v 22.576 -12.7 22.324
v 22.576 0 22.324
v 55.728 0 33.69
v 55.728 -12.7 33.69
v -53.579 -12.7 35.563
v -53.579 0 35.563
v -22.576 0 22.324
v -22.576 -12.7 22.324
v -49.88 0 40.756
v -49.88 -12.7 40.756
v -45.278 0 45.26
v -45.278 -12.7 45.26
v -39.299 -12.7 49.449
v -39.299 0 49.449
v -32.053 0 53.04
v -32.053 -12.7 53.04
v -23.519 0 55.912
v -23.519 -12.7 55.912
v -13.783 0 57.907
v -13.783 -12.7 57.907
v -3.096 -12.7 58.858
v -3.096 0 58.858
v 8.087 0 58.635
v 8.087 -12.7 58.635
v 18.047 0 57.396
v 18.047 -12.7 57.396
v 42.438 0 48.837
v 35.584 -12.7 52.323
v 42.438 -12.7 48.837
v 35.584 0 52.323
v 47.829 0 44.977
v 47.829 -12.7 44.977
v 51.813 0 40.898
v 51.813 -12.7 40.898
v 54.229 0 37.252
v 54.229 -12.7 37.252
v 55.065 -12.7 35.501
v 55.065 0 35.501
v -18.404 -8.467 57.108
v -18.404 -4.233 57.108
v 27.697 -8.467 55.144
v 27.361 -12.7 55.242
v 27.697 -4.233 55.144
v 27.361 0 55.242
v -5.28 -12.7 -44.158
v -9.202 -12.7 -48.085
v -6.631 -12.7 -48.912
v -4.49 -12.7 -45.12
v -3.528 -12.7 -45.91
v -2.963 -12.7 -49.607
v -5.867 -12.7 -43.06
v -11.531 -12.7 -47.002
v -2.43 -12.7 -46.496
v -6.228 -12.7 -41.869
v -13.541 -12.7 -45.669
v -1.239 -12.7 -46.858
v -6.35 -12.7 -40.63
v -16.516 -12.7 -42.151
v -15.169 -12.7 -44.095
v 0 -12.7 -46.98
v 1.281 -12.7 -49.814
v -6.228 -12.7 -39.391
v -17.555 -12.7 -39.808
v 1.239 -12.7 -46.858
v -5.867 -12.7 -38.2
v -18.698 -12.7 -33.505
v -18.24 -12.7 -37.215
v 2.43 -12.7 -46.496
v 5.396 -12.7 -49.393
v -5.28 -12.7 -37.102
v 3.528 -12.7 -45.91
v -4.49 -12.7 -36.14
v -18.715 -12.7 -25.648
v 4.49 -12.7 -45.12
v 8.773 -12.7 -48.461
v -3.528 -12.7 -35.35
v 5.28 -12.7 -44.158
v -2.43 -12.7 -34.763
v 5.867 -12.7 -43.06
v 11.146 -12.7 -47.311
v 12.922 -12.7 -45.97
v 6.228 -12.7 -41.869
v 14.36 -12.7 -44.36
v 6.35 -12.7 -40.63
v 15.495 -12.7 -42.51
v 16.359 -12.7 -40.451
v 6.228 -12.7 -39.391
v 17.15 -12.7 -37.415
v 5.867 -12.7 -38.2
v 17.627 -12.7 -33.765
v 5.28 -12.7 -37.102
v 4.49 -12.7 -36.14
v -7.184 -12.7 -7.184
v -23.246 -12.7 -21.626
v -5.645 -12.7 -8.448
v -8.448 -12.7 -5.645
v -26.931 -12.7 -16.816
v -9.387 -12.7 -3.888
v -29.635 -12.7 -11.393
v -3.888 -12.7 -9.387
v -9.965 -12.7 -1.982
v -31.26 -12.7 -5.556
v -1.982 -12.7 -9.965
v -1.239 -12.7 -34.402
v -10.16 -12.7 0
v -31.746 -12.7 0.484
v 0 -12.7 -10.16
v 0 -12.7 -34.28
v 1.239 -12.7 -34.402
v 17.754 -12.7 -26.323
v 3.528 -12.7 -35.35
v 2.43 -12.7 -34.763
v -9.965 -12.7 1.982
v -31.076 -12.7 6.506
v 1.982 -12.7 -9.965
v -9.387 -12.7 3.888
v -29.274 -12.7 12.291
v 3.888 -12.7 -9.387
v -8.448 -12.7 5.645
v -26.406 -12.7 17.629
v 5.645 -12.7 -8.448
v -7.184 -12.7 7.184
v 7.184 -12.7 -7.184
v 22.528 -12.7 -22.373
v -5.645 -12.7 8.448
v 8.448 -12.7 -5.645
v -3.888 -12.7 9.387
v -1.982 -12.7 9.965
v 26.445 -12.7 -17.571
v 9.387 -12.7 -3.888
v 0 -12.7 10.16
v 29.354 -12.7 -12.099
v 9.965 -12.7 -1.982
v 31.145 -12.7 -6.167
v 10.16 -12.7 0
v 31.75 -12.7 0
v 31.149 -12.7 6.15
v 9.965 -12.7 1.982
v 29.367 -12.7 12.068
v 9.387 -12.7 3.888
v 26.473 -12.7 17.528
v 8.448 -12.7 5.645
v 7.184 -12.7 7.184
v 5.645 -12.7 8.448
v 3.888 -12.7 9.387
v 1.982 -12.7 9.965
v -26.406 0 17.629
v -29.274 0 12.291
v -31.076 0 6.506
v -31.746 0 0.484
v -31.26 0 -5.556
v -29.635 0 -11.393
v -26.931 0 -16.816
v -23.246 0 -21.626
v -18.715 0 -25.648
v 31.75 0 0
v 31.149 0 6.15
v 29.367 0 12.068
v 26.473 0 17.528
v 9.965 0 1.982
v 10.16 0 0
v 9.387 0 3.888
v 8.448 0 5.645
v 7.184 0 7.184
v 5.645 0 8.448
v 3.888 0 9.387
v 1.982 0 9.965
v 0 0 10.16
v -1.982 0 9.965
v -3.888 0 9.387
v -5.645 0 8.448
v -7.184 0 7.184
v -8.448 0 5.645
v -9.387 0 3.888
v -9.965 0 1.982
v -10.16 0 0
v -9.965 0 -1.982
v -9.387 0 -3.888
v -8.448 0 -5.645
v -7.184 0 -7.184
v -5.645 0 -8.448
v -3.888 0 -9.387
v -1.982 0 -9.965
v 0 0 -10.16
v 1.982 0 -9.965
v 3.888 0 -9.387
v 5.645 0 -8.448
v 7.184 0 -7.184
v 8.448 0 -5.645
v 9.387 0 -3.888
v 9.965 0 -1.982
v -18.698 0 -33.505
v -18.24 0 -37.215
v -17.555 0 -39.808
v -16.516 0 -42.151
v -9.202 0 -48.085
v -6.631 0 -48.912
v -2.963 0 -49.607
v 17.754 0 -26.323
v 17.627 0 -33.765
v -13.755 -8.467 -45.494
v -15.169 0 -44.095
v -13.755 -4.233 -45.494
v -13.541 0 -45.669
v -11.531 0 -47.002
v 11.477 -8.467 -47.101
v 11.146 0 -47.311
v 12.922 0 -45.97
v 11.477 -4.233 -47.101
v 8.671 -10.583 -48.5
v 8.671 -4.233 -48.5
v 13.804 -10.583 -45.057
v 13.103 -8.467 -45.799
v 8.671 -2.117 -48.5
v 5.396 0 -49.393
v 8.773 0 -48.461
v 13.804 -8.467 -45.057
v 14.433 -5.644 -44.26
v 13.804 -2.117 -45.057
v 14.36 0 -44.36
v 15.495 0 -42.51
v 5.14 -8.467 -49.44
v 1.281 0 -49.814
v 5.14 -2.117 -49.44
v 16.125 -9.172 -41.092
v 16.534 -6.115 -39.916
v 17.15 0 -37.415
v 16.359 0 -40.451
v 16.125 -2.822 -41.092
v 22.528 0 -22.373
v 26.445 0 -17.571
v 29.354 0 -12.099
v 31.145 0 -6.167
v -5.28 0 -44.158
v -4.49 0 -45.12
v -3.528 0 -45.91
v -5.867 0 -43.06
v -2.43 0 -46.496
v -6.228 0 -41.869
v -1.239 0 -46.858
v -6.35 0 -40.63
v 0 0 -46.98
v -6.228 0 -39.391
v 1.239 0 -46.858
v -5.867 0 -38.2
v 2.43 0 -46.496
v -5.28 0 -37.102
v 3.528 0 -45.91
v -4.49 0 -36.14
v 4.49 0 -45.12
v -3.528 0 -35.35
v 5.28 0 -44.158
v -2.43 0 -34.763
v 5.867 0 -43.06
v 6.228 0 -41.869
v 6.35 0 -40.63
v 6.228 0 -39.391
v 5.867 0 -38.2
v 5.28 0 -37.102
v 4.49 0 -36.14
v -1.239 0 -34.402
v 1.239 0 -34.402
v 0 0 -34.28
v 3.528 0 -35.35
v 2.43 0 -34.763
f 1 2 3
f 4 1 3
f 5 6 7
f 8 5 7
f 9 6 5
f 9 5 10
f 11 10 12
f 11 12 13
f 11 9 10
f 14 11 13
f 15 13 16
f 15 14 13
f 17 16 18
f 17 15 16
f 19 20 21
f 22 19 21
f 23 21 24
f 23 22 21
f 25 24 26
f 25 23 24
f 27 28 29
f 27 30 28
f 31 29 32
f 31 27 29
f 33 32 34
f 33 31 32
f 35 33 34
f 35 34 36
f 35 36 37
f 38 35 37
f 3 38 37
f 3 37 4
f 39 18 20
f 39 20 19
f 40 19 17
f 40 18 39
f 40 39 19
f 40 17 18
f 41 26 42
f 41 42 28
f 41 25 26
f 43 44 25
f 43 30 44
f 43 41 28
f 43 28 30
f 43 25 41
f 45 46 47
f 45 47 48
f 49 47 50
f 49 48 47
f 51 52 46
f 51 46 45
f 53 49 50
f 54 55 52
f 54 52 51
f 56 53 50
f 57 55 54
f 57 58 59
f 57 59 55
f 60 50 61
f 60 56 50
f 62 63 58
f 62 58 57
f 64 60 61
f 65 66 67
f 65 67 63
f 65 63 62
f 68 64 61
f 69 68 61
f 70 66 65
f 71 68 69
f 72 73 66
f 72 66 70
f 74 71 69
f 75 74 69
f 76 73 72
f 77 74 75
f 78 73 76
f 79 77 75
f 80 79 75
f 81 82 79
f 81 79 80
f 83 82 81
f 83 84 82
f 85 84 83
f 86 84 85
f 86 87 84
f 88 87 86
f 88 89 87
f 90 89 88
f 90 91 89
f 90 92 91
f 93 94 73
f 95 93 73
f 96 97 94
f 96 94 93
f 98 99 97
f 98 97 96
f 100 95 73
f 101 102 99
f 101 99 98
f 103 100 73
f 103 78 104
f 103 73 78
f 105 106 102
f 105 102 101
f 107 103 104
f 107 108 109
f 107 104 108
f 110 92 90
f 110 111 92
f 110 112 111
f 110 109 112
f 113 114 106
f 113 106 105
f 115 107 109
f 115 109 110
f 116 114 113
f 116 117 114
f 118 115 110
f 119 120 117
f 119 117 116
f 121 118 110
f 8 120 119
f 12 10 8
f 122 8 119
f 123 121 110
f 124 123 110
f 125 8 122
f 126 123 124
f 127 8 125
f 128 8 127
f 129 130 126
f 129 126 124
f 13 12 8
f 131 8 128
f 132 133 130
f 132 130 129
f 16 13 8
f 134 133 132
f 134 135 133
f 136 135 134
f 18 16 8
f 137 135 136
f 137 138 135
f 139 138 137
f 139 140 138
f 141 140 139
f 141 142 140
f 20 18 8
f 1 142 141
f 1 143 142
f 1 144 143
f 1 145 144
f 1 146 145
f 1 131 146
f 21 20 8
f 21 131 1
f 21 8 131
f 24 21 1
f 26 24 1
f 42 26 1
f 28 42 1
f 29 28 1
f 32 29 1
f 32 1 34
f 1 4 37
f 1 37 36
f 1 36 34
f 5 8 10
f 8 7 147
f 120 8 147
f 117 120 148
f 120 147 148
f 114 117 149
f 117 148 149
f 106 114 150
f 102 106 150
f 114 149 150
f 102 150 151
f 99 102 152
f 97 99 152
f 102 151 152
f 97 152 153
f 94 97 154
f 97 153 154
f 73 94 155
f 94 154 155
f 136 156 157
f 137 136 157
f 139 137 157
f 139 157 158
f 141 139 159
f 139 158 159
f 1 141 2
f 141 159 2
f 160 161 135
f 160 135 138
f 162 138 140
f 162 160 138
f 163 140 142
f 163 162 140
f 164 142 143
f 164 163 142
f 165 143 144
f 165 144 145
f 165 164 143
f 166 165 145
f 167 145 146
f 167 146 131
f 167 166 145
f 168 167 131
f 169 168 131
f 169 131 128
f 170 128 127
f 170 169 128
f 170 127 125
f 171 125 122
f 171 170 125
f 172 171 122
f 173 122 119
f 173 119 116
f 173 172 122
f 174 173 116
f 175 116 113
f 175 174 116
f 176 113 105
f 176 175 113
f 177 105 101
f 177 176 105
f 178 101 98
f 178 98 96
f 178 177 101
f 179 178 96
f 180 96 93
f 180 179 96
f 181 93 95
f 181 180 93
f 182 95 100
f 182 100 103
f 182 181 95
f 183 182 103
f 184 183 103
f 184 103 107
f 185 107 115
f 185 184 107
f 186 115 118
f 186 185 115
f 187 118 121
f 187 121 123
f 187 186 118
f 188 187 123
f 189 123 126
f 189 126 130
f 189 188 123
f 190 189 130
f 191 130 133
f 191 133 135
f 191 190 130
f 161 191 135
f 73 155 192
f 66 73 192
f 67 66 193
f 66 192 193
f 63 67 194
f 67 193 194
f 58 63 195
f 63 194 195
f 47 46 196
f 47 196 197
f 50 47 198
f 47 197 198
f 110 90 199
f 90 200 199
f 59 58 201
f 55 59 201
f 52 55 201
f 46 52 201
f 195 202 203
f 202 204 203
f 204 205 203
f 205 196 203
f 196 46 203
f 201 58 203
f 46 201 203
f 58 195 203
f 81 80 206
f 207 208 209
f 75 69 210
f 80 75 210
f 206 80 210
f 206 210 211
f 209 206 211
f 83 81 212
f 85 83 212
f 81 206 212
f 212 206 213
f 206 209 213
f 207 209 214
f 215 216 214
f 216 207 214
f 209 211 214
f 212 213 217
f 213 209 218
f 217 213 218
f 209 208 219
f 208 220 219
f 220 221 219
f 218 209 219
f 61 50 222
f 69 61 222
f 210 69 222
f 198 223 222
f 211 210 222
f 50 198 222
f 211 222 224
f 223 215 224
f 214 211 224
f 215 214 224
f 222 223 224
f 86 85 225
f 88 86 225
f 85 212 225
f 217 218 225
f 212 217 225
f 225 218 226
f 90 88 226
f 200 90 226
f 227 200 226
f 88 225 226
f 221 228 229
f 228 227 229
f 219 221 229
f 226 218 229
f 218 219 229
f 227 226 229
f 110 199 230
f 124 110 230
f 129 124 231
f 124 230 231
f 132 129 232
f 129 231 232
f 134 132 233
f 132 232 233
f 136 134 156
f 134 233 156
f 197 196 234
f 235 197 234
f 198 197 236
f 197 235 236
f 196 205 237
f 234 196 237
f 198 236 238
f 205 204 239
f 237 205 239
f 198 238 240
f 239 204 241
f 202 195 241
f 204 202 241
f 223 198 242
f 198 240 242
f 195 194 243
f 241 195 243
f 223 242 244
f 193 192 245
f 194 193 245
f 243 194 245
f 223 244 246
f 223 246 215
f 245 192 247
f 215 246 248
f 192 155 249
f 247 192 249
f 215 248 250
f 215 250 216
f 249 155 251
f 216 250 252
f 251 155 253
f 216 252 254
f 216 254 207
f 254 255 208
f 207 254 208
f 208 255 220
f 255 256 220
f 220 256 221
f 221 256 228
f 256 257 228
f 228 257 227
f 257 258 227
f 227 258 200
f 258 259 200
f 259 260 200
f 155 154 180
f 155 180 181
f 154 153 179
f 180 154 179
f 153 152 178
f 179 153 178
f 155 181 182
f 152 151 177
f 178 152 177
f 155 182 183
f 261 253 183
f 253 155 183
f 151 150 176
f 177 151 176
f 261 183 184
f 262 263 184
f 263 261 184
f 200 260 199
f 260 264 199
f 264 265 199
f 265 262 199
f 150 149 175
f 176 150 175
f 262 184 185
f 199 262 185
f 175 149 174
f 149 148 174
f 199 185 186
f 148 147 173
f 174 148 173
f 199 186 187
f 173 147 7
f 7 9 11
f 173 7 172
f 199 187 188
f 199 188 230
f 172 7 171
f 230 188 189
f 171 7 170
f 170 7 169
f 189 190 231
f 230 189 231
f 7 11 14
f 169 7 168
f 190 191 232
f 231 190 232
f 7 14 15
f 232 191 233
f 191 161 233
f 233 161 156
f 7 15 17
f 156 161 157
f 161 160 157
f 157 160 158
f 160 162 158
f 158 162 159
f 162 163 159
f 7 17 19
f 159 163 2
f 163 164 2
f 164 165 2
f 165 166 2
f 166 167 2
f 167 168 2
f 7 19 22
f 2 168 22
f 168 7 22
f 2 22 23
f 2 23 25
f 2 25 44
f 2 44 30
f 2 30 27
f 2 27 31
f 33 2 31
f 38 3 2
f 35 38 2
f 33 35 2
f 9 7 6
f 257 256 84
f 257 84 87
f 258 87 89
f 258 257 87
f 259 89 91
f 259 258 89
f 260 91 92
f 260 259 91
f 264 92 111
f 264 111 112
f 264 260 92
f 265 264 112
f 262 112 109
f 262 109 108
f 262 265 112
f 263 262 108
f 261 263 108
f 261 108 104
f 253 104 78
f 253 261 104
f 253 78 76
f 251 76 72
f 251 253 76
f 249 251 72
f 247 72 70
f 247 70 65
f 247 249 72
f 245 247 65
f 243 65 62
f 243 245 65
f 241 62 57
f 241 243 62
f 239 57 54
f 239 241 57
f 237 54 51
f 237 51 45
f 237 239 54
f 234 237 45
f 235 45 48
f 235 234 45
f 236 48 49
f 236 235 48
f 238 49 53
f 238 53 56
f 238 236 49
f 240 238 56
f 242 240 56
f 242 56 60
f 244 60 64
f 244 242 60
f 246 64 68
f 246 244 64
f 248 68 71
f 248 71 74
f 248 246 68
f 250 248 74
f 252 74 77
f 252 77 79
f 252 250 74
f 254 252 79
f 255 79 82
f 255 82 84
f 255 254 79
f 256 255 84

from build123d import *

# Parameters (mm, degrees)
F0_R     = 10.16
F0_R_2   = 6.35
F1_DEPTH = 12.7


with BuildPart() as f1:
    # F0 (on Front) → F1 (new body)
    with BuildSketch(Plane.XZ):
        with BuildLine():
            ThreePointArc((-22.5764605638, 22.324110921), (0, 31.75), (22.5764605638, 22.324110921))
            Line((22.5764605638, 22.324110921), (55.7279327263, 33.6904105914))
            add(Edge.make_bspline(
                [(-53.578904017, 35.5630292681), (-33.5322332568, 70.2029654889), (46.3976245244, 63.5476266624), (55.7279327263, 33.6904105914)],
                knots=[0, 0, 0, 0, 109.3228761949, 109.3228761949, 109.3228761949, 109.3228761949], degree=3))
            Line((-53.578904017, 35.5630292681), (-22.5764605638, 22.324110921))
        make_face()
        with BuildLine():
            ThreePointArc((17.7535295726, -26.3225129445), (28.0333467849, -14.9061721456), (31.75, 0))
            ThreePointArc((31.75, 0), (29.3672021386, 12.067723006), (22.5764605638, 22.324110921))
            ThreePointArc((22.5764605638, 22.324110921), (0, 31.75), (-22.5764605638, 22.324110921))
            ThreePointArc((-22.5764605638, 22.324110921), (-31.6476270633, -2.5475873414), (-18.7147767568, -25.6479946769))
            ThreePointArc((-18.7147767568, -25.6479946769), (-0.5871479887, -31.7445705159), (17.7535295726, -26.3225129445))
        make_face()
        Circle(F0_R, mode=Mode.SUBTRACT)
        with BuildLine():
            add(Edge.make_bspline(
                [(-18.7147767568, -25.6479946769), (-18.9355896144, -33.2121243406), (-19.321526262, -49.686071611), (16.9001065861, -52.1663001494), (17.9694969141, -34.8175484735), (17.7535295726, -26.3225129445)],
                knots=[0, 0, 0, 0, 0.3182872314, 0.6721361216, 1, 1, 1, 1], degree=3))
            ThreePointArc((17.7535295726, -26.3225129445), (-0.5871479887, -31.7445705159), (-18.7147767568, -25.6479946769))
        make_face()
        with Locations((0, -40.6298153102)):
            Circle(F0_R_2, mode=Mode.SUBTRACT)
    extrude(amount=F1_DEPTH)


solid = f1.part
